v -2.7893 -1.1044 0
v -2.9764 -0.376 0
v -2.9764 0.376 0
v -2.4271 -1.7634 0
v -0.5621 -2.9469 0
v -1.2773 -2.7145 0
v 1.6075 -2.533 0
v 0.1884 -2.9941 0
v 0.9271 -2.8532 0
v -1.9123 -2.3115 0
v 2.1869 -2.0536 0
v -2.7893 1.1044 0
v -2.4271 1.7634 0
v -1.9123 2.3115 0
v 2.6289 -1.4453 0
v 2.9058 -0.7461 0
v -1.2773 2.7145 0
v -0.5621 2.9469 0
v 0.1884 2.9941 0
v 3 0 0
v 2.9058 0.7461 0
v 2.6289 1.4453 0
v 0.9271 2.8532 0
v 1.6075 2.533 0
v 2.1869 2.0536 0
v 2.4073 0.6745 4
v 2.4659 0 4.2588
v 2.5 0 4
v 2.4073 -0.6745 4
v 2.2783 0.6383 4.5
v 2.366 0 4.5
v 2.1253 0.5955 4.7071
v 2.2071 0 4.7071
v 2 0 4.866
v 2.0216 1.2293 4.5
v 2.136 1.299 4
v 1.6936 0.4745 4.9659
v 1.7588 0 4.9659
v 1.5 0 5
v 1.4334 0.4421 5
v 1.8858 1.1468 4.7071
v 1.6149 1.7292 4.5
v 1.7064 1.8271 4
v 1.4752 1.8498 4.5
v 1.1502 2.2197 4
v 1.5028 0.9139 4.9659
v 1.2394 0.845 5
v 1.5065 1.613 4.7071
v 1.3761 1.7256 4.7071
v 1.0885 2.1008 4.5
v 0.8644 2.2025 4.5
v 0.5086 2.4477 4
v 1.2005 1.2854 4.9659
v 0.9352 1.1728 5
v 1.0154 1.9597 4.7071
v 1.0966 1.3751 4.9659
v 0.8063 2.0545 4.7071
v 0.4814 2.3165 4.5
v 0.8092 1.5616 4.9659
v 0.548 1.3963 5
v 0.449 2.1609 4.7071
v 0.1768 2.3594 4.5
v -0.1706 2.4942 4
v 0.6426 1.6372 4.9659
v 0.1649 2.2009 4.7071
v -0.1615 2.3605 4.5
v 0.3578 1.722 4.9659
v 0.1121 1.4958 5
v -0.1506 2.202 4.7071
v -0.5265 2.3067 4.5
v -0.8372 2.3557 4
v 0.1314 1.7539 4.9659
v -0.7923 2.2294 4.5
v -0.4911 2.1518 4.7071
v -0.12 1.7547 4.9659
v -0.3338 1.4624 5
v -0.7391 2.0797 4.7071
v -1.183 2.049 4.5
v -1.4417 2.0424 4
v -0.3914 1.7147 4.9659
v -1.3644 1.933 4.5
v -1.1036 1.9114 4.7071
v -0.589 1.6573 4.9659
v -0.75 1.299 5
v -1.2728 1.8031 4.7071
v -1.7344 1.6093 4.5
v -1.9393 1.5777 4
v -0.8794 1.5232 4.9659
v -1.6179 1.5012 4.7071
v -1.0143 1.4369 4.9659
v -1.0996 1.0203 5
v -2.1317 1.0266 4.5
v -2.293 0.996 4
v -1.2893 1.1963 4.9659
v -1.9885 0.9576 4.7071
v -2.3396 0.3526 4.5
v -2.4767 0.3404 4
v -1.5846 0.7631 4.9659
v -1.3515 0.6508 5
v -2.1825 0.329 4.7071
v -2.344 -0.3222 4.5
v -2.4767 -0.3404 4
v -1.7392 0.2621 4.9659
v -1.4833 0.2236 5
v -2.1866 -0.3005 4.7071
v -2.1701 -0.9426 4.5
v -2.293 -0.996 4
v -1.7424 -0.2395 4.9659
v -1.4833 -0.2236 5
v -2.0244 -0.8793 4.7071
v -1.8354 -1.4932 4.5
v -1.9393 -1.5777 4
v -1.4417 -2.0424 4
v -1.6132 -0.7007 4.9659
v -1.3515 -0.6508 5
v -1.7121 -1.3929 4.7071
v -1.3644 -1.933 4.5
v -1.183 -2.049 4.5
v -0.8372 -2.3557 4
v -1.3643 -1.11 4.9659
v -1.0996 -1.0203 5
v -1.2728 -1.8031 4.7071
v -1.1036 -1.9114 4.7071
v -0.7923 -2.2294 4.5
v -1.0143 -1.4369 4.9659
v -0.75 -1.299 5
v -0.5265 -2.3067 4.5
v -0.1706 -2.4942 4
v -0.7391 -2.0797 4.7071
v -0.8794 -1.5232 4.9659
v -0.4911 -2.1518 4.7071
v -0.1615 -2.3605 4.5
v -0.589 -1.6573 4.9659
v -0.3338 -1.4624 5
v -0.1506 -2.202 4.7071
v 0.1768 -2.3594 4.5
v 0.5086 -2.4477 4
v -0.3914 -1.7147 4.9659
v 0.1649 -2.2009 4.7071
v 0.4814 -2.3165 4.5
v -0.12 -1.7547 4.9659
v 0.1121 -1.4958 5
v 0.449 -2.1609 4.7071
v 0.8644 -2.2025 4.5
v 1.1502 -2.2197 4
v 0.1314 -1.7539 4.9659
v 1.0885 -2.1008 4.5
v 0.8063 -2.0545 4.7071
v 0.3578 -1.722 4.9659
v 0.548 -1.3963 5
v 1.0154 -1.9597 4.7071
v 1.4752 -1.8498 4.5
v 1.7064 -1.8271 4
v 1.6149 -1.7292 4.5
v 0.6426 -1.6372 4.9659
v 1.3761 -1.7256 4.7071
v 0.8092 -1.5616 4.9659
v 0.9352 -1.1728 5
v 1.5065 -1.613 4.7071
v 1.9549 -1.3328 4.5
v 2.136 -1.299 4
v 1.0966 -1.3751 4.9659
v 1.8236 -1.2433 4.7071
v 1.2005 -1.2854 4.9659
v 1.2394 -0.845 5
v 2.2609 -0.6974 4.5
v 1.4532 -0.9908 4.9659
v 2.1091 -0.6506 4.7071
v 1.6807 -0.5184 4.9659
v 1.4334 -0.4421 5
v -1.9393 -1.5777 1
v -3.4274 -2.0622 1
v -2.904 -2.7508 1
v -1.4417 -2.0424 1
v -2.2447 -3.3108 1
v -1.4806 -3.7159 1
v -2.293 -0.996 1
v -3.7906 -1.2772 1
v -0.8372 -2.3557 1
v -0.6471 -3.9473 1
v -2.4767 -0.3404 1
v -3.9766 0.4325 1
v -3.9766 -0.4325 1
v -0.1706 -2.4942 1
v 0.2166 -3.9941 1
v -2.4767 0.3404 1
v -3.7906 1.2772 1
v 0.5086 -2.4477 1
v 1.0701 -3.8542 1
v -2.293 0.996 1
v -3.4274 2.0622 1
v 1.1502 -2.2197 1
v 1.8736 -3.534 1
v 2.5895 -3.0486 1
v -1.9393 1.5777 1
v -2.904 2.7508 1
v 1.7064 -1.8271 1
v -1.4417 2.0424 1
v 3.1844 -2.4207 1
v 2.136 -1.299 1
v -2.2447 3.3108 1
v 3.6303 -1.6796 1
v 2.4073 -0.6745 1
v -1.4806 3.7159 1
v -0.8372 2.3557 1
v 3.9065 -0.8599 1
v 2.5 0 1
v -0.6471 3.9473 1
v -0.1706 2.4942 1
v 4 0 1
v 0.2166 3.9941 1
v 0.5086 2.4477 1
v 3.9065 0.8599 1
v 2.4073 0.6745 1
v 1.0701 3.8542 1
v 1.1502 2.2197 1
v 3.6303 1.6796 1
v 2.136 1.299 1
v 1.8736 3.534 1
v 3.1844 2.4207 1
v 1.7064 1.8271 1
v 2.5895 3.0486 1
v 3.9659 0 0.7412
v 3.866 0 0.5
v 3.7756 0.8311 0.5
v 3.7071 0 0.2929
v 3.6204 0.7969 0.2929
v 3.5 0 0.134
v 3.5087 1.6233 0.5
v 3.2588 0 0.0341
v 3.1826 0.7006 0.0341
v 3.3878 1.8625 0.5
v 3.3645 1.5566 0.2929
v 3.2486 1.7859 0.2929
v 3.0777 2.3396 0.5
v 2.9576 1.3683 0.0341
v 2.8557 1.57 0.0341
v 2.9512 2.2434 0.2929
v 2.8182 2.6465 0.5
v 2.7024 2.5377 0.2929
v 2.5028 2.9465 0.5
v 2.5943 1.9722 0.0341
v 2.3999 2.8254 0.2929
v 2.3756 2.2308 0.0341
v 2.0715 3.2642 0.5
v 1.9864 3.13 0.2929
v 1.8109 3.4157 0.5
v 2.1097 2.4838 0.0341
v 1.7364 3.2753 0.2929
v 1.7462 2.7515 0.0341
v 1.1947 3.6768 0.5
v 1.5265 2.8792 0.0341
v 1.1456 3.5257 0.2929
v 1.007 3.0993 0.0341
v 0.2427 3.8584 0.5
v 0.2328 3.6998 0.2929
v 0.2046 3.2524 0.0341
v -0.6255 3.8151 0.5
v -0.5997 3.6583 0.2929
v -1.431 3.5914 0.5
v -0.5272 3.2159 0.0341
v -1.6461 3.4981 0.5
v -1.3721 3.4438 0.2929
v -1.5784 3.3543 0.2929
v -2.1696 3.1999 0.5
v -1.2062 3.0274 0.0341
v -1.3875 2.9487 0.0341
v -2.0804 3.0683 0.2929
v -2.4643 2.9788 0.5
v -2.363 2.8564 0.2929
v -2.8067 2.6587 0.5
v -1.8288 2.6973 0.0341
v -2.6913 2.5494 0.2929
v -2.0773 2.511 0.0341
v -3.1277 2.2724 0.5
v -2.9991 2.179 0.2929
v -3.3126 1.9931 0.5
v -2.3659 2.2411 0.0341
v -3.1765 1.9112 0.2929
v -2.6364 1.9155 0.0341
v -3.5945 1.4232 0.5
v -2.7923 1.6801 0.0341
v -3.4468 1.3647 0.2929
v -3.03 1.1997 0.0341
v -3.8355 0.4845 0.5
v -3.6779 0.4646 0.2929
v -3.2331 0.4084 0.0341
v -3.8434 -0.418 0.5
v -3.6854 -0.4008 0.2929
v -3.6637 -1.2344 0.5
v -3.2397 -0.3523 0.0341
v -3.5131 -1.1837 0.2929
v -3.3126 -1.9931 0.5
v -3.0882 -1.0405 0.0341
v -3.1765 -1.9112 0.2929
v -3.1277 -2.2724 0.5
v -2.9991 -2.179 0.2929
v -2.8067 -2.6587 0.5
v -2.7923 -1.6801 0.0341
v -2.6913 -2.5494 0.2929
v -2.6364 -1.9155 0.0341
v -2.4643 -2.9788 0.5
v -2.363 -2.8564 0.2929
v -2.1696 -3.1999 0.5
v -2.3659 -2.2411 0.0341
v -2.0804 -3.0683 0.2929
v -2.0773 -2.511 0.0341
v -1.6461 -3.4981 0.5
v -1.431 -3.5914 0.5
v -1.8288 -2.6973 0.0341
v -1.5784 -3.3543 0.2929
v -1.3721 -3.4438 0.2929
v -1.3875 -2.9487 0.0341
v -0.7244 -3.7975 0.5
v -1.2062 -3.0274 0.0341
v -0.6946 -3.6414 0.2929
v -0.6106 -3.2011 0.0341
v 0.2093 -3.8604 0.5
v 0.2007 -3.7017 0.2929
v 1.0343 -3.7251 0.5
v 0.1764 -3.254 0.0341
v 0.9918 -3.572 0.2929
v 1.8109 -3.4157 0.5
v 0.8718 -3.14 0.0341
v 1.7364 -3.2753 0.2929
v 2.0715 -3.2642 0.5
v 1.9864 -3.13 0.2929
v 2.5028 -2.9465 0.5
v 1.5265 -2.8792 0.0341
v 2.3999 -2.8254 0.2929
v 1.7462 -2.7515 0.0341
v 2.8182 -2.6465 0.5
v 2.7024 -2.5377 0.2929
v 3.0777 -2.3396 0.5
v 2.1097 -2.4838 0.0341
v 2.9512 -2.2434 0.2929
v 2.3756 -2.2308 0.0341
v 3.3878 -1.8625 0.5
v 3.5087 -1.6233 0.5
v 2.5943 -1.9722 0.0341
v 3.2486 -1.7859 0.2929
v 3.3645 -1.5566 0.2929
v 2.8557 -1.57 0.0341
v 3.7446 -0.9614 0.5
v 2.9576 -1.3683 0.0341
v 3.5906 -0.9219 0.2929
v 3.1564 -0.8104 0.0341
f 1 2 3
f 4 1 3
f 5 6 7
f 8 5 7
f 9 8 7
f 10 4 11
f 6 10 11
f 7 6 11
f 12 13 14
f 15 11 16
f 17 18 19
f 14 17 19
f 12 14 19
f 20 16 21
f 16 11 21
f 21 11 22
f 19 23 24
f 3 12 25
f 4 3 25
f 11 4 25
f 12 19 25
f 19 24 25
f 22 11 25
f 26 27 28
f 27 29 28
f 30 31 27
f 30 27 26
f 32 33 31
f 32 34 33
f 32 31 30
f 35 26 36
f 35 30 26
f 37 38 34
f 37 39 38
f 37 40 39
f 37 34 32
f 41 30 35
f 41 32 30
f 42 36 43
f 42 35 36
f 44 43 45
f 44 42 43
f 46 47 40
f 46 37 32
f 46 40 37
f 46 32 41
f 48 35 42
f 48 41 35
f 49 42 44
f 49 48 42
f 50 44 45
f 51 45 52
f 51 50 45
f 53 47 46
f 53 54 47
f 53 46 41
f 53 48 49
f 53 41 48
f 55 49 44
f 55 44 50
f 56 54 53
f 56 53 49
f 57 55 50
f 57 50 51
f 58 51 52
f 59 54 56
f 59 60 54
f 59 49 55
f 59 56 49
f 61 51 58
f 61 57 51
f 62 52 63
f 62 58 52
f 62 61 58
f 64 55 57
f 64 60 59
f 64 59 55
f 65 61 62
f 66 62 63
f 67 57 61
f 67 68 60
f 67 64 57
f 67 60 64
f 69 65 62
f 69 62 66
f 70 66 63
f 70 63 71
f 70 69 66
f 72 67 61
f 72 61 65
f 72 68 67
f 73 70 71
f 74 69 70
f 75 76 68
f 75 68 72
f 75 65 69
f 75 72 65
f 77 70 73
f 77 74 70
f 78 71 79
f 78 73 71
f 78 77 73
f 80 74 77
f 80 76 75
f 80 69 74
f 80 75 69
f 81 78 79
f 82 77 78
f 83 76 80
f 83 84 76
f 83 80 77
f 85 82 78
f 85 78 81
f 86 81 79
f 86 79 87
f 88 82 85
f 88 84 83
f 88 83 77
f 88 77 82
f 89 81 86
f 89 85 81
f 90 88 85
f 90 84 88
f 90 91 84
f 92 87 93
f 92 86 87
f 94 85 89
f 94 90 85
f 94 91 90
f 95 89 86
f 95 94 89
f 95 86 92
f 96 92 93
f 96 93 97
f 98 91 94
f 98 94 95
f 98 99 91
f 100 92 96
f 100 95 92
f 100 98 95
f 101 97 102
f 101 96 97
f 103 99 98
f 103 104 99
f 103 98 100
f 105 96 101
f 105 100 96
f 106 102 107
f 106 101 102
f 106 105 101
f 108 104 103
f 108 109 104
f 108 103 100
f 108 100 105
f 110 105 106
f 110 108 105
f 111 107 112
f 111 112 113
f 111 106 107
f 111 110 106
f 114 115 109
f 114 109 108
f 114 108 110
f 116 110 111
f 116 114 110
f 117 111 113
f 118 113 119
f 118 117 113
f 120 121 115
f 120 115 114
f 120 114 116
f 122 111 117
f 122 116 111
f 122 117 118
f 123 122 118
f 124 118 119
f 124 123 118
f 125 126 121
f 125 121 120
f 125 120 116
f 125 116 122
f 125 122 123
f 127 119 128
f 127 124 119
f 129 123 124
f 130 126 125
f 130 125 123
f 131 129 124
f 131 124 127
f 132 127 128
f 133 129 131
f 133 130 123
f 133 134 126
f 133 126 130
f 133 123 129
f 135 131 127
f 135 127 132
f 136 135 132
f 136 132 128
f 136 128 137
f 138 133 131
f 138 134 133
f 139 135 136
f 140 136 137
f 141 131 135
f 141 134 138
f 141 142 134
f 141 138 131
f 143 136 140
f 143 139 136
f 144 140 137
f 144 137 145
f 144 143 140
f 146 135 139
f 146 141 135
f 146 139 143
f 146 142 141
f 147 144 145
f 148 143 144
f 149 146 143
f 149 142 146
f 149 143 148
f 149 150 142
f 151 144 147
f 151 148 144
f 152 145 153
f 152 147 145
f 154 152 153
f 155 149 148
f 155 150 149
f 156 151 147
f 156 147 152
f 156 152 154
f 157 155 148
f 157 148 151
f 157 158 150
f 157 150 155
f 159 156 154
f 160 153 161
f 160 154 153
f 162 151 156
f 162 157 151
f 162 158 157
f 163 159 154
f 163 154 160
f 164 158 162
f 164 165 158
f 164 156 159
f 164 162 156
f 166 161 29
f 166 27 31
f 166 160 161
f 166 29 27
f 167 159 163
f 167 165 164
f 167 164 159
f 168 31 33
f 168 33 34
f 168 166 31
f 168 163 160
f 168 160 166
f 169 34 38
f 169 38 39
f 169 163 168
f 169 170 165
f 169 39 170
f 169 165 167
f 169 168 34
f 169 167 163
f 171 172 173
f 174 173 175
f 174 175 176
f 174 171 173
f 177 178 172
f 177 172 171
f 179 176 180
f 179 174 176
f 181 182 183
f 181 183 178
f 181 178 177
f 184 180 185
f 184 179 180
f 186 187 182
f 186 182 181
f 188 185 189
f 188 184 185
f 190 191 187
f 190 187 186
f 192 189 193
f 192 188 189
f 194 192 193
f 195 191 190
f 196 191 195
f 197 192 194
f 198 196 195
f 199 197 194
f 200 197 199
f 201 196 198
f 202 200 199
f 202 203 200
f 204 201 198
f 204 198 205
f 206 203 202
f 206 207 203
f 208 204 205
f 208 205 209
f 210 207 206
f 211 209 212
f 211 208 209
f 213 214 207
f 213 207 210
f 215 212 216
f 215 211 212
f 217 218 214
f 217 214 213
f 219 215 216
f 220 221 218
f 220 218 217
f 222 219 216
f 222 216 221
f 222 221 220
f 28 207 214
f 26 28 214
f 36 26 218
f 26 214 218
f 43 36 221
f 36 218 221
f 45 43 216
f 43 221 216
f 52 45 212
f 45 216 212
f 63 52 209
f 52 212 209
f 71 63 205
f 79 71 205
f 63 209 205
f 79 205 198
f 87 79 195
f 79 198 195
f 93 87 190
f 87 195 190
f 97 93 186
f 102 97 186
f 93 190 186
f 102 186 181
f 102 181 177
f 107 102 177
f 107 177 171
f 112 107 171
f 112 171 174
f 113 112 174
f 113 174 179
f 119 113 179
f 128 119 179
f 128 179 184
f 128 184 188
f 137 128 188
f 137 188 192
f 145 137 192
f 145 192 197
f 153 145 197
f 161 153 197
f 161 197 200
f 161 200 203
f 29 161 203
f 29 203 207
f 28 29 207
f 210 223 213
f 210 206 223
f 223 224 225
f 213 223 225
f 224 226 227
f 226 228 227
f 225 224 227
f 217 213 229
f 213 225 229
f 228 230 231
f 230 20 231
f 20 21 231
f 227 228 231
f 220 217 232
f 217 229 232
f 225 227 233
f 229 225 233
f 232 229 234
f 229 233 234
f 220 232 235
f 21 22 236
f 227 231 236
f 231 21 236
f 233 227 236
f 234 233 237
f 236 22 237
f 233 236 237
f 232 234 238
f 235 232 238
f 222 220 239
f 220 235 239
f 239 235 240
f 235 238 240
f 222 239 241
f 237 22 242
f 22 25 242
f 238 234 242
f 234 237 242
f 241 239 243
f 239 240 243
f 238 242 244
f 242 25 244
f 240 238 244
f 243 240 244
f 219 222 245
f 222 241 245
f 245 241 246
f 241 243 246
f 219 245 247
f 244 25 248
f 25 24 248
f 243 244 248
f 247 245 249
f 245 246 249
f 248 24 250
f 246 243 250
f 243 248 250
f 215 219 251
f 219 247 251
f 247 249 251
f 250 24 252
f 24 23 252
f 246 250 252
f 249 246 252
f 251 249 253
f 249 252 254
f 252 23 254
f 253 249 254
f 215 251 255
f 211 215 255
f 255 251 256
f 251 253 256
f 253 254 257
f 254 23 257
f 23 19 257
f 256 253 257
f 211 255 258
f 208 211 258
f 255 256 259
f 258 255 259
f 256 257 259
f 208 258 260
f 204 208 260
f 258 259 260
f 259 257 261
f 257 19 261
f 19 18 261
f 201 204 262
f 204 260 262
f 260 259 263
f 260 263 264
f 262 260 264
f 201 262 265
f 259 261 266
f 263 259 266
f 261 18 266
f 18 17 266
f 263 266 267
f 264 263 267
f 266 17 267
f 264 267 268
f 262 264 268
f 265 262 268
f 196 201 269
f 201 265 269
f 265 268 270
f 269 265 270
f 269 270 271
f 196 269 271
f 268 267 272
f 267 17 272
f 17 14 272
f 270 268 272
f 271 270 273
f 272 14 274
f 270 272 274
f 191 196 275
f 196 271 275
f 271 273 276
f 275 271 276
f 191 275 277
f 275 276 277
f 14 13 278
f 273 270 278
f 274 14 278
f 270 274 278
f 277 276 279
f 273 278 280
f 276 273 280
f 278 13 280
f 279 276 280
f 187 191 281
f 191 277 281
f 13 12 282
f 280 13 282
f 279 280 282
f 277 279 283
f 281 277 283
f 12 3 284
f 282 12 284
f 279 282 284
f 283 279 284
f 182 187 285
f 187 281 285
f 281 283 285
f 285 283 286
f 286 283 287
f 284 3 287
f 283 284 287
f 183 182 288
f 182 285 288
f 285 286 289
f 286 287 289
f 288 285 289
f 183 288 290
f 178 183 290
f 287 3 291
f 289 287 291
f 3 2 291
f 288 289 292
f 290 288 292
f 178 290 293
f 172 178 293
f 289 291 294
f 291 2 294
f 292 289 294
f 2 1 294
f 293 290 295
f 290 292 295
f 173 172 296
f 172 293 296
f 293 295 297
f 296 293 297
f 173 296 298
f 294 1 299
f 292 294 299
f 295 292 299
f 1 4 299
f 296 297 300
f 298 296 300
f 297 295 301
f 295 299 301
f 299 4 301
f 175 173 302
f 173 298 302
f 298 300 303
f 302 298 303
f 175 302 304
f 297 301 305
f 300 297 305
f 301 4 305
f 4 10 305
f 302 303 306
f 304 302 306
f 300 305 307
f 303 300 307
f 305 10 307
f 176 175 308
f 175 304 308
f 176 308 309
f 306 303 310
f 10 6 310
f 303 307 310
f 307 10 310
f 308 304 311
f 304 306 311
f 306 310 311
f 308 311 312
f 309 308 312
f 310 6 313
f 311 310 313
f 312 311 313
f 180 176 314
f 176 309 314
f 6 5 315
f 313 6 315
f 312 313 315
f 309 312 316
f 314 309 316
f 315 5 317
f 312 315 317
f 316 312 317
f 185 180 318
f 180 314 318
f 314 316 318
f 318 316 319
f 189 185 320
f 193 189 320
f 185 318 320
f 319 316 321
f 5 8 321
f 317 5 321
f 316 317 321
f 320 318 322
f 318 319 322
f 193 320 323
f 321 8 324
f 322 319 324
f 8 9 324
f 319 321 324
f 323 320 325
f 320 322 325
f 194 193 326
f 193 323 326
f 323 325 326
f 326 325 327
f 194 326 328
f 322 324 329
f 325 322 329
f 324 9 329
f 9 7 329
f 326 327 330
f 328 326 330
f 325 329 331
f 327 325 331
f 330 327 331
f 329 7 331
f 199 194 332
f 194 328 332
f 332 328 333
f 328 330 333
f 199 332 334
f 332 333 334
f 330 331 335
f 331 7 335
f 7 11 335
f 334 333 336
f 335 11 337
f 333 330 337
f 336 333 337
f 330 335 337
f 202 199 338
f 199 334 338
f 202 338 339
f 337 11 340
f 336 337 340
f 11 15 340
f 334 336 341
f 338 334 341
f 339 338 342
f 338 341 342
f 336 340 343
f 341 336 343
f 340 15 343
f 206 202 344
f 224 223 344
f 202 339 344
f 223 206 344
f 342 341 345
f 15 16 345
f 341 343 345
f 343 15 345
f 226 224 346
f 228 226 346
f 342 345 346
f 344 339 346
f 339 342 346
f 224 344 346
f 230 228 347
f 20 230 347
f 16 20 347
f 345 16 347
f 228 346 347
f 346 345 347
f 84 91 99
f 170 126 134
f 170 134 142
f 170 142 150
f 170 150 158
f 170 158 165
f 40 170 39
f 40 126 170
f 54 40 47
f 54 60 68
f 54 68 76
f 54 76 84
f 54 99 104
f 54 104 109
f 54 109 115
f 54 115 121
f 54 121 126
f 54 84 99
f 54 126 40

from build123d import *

# Parameters (mm, degrees)
F0_R     = 2.5
F1_DEPTH = 5
F0_R_2   = 4
F2_DEPTH = 1
F3_R     = 0.99999


# Not quite as in the source:
# - a fillet or chamfer is up to 0.001 mm smaller than in the source, because OpenCascade refuses the exact size


with BuildPart() as f1:
    # F0 (on Top) → F1 (new body)
    with BuildSketch(Plane.XY):
        Circle(F0_R)
    extrude(amount=F1_DEPTH)

    # F0 (on Top) → F2 (join)
    with BuildSketch(Plane.XY):
        Circle(F0_R_2)
        Circle(F0_R, mode=Mode.SUBTRACT)
    extrude(amount=F2_DEPTH)

    # F3 (radius 1 in the source; OpenCascade refuses exactly that, so slightly less here)
    f3_edges = [f1.edges().sort_by_distance(p)[0] for p in [
        (-4, 0, 0),
        (-2.5, 0, 5),
    ]]
    fillet(f3_edges, radius=F3_R)


solid = f1.part
